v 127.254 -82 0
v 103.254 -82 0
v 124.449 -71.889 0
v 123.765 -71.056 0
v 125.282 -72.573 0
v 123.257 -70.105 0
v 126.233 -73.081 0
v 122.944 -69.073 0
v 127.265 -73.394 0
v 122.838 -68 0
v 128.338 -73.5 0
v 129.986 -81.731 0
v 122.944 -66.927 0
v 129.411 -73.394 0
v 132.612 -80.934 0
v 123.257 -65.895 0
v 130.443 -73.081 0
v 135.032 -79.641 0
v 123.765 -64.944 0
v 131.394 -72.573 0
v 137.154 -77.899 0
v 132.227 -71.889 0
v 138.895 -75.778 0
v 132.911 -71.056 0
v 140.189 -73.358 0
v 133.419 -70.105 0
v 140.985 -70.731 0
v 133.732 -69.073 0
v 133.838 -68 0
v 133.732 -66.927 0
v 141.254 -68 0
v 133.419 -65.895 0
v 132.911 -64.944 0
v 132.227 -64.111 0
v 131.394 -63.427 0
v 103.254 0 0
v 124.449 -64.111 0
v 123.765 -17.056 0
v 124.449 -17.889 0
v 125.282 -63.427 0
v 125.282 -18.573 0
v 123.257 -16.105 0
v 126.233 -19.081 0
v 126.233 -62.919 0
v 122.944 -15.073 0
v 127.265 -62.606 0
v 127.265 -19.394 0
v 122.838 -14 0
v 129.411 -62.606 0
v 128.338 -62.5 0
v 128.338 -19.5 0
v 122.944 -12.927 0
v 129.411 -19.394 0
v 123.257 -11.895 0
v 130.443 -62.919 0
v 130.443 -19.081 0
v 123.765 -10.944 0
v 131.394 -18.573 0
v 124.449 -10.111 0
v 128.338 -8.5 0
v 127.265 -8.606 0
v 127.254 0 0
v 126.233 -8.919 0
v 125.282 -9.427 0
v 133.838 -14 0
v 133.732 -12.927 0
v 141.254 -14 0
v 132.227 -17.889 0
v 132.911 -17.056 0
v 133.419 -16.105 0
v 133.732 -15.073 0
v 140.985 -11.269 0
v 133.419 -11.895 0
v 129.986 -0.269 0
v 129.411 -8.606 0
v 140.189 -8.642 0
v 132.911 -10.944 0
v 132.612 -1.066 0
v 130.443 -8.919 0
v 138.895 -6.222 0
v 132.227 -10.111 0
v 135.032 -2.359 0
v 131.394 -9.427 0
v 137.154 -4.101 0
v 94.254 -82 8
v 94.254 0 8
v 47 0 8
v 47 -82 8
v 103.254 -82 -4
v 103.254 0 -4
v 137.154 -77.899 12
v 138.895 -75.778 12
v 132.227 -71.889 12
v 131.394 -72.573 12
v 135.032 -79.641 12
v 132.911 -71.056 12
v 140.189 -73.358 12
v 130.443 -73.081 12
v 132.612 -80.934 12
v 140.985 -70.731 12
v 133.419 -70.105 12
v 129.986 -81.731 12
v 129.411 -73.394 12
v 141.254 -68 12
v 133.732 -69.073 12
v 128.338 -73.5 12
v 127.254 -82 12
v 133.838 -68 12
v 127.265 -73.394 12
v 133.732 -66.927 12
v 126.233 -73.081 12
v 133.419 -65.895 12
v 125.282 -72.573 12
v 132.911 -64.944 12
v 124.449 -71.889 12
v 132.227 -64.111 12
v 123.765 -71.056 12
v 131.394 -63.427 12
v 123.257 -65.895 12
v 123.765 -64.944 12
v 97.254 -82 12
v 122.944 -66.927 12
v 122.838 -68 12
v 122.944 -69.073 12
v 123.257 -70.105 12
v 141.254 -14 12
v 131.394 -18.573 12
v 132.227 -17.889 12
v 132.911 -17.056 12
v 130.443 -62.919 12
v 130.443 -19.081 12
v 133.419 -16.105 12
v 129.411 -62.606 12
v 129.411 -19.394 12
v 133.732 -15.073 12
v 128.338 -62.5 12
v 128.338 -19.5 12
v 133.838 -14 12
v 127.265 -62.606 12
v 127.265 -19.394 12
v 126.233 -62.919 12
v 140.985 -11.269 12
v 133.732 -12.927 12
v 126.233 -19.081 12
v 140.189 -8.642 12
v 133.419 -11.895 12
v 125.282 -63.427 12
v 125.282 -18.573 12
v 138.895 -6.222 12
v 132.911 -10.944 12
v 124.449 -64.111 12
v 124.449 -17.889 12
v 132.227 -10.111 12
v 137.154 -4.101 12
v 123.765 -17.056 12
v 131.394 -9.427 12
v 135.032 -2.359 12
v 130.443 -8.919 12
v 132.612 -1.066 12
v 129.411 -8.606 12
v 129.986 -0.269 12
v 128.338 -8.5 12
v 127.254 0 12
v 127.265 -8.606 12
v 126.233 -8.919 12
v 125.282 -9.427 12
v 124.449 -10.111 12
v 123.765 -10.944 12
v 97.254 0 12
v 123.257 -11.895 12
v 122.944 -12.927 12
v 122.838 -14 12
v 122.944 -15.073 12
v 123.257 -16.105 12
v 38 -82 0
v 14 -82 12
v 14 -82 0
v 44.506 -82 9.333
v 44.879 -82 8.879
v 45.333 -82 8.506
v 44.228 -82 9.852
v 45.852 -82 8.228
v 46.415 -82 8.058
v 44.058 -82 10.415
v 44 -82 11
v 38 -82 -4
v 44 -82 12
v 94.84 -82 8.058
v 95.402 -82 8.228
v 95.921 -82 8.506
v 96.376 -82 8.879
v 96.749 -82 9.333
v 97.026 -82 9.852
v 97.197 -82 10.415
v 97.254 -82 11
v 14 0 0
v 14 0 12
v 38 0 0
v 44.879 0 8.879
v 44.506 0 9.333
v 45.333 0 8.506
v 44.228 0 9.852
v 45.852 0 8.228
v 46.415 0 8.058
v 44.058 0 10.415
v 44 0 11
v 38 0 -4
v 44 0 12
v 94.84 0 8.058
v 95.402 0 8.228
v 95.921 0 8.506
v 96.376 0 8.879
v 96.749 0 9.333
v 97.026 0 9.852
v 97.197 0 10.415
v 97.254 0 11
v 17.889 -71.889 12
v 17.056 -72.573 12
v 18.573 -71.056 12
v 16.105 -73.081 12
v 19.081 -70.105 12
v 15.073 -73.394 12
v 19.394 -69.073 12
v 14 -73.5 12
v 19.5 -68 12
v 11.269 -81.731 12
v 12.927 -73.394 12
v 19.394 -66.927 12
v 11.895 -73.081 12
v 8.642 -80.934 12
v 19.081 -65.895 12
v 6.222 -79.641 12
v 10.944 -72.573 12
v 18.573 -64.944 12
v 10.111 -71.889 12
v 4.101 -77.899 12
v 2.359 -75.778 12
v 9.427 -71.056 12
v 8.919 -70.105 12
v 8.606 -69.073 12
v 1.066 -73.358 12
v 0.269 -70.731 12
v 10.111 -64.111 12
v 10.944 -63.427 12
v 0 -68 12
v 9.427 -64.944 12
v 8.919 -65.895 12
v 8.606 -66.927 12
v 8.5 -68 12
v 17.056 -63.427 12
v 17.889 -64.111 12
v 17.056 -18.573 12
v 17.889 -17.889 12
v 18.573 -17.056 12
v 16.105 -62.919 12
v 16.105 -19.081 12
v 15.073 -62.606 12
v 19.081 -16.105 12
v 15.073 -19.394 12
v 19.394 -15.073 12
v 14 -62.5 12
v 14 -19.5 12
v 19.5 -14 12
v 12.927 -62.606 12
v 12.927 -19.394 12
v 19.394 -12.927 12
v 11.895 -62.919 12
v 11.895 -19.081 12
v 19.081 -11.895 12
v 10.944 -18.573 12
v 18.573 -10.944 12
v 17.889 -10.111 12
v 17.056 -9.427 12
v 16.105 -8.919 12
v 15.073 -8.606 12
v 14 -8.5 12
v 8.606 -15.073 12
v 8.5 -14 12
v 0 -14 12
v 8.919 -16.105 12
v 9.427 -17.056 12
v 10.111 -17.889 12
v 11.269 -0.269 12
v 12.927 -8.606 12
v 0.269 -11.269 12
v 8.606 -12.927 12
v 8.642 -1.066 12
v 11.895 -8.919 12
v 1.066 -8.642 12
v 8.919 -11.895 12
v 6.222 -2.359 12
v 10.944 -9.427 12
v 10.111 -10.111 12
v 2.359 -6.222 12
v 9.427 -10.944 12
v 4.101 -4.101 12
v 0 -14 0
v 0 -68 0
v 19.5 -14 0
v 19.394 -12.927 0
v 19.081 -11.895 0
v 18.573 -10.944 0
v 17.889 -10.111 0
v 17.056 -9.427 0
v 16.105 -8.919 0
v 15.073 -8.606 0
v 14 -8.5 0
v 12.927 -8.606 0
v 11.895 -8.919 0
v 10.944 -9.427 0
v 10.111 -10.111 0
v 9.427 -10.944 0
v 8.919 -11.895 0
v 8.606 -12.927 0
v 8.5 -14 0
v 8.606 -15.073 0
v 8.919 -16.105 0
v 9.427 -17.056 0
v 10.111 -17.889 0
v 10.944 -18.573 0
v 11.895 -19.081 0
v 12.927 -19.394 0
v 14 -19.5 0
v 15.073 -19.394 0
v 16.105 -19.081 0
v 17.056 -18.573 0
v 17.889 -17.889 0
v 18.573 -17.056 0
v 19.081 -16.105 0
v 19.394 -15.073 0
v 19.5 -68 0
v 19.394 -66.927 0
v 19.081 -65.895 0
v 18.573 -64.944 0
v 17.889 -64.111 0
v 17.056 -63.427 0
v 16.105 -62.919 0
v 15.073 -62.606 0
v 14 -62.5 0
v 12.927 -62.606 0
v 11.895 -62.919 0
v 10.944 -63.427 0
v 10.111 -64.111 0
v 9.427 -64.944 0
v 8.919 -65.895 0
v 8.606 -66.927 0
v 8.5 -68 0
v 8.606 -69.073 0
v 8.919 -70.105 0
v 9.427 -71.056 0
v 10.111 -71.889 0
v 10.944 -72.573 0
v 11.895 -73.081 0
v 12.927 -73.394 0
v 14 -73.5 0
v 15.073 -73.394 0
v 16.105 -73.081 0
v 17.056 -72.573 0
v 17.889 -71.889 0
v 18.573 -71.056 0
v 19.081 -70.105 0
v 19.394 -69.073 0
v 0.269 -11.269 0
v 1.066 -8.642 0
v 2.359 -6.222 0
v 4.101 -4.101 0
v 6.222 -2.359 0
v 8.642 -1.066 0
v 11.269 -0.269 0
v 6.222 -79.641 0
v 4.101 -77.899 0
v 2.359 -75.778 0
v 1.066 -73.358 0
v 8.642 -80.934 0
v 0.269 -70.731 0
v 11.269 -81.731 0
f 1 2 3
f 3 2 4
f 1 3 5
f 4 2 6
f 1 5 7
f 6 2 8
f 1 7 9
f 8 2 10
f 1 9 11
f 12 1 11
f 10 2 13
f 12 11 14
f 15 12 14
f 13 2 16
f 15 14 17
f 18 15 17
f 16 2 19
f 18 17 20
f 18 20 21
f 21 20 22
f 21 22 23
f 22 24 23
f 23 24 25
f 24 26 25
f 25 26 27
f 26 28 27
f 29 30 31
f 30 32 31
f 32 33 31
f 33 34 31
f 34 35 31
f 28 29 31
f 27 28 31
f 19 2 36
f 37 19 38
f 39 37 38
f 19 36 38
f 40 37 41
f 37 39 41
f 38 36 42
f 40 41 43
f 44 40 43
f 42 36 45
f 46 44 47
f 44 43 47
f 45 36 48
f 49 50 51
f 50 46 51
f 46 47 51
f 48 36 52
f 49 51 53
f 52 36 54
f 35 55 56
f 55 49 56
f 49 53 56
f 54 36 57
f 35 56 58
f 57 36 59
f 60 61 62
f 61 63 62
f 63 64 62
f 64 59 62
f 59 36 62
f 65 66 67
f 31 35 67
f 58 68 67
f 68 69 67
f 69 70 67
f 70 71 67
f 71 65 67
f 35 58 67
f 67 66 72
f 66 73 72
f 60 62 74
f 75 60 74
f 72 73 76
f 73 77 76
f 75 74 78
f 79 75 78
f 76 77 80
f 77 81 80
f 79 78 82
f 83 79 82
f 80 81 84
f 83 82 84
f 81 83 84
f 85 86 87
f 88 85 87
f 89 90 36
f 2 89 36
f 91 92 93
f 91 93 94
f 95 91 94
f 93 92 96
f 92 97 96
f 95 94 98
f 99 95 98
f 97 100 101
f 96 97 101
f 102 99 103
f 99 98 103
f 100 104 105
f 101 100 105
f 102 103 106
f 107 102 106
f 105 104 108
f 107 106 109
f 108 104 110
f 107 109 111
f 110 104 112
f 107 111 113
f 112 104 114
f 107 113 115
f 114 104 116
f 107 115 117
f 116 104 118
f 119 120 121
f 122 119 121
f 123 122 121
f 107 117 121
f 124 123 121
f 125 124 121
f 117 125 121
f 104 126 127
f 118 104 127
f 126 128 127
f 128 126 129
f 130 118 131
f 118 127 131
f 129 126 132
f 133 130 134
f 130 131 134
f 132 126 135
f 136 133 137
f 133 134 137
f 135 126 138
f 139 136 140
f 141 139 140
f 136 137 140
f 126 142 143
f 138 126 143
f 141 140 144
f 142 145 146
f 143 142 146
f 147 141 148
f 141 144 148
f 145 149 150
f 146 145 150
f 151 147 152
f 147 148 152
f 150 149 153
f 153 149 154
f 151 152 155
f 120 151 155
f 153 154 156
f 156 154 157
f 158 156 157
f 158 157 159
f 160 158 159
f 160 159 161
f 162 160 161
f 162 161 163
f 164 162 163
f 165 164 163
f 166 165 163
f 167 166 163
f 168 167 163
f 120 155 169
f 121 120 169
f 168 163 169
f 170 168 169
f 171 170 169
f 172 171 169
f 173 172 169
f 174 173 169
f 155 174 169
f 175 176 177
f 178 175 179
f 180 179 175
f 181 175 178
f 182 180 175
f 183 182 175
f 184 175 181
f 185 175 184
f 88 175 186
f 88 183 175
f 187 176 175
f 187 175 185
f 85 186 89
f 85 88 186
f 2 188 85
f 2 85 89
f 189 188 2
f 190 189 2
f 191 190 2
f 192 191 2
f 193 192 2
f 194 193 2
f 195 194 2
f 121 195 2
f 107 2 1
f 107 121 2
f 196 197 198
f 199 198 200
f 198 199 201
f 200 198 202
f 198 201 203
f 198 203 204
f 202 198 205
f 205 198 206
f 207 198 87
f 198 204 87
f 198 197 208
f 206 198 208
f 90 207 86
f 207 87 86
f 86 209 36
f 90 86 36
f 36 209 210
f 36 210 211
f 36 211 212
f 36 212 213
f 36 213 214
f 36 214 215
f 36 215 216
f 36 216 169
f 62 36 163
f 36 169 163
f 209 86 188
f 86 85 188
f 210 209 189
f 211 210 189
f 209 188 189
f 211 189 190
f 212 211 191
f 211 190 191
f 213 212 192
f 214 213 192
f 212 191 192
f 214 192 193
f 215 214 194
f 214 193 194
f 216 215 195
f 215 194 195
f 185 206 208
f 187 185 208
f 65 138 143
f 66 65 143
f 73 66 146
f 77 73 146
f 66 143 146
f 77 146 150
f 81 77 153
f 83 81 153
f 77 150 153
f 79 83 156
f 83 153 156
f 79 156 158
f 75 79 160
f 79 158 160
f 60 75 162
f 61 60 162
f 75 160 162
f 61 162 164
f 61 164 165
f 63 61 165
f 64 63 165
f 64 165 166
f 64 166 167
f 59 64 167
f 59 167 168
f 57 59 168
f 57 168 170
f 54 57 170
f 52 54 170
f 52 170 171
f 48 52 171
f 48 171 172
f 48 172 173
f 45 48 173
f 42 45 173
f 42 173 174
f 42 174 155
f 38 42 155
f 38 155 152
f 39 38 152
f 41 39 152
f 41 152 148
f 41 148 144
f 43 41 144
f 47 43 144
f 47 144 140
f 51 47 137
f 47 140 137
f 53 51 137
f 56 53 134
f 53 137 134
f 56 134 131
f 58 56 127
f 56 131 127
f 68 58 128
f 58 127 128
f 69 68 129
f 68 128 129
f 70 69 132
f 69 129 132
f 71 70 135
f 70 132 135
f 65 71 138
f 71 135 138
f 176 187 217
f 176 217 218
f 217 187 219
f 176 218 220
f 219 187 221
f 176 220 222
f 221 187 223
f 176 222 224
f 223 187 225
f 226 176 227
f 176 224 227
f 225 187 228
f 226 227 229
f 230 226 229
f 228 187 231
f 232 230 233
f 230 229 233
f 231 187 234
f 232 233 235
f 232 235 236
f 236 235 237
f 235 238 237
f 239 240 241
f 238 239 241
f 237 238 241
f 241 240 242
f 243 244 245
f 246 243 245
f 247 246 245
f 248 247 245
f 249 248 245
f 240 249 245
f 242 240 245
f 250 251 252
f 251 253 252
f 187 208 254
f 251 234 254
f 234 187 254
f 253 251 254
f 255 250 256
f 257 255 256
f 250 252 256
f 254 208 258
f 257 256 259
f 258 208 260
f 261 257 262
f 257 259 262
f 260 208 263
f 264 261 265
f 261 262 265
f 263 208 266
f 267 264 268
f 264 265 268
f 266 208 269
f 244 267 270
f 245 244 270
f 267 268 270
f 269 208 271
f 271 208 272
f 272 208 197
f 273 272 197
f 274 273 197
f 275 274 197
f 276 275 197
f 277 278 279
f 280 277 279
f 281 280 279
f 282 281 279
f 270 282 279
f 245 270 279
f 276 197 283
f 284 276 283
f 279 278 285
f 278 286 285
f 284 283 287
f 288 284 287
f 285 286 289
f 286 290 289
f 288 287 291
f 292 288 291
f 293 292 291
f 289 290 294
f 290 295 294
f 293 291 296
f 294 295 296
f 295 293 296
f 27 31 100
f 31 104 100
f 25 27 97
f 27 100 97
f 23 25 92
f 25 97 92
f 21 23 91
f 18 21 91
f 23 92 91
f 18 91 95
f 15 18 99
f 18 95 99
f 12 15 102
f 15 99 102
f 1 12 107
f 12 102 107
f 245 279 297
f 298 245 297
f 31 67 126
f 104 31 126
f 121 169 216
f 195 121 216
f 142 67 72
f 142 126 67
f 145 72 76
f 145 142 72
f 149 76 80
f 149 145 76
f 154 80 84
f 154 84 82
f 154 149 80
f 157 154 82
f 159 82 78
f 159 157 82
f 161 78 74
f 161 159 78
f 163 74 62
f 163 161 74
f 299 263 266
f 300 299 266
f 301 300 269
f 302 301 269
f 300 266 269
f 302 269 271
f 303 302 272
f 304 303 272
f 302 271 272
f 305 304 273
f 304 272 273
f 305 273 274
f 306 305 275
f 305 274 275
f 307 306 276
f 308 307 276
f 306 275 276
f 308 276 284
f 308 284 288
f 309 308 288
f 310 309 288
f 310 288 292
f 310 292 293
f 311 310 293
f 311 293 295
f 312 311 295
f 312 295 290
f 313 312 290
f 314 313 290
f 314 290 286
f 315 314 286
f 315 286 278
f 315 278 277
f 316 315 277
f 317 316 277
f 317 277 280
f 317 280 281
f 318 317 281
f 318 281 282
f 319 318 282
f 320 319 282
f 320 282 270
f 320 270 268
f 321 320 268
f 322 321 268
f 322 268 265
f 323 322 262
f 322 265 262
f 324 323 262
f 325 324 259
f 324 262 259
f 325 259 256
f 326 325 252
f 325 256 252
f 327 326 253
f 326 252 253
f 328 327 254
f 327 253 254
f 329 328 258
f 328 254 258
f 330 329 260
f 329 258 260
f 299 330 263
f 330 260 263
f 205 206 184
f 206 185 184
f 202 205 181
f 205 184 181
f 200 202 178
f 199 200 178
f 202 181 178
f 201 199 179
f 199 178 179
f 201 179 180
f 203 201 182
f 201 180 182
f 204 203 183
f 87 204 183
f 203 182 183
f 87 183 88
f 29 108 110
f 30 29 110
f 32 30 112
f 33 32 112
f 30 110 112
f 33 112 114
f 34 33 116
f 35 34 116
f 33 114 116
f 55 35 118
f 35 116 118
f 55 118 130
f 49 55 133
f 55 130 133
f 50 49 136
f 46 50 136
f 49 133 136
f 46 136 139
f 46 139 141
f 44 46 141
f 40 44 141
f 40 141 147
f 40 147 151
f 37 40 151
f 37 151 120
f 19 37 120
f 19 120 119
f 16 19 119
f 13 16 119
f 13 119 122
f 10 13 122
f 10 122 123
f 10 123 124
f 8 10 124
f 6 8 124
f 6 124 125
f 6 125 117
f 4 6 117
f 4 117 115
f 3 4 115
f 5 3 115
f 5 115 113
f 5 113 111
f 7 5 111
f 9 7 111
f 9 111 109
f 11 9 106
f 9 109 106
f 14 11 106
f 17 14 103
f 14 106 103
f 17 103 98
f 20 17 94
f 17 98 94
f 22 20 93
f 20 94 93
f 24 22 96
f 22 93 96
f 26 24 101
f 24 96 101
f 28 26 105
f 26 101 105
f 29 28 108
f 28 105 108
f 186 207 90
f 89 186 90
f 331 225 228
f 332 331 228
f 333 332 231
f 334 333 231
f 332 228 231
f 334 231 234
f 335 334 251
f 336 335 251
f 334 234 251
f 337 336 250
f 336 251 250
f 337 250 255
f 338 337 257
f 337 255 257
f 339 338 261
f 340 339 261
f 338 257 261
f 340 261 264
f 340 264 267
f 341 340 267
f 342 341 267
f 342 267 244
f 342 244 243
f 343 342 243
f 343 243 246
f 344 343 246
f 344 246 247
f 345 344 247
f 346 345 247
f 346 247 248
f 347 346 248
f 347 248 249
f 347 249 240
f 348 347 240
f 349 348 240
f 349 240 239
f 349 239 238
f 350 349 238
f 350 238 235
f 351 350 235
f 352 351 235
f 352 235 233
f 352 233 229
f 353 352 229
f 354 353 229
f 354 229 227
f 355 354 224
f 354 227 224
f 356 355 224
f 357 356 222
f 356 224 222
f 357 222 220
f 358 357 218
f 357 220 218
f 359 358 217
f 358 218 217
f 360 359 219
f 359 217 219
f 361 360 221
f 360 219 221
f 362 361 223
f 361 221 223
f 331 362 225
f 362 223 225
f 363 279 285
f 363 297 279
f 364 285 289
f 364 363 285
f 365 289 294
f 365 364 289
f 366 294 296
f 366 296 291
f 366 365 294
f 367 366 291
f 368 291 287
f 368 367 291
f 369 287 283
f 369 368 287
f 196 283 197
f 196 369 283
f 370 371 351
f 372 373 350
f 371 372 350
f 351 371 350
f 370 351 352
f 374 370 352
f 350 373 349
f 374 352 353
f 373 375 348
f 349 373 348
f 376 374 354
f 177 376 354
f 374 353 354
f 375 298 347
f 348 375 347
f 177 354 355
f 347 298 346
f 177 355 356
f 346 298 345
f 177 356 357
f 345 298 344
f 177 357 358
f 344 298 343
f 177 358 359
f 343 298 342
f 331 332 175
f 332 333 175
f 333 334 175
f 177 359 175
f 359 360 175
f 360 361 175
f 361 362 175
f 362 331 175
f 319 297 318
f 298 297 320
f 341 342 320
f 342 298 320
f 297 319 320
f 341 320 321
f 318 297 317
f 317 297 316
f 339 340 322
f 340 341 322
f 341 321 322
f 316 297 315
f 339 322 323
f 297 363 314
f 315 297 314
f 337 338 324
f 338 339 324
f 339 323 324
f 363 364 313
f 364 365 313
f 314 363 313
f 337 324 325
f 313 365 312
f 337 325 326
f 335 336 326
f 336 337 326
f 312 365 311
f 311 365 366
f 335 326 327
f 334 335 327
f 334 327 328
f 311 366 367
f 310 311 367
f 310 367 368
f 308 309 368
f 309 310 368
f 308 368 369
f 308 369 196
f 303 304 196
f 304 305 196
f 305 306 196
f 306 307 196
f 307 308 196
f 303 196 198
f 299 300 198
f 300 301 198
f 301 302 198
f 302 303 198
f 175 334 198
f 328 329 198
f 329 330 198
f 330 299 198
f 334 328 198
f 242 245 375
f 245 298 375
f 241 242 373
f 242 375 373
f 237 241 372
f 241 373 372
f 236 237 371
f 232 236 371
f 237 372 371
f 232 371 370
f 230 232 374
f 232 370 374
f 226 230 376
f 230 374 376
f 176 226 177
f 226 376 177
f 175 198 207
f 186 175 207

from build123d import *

# Parameters (mm, degrees)
F1_DEPTH = 82
F2_R     = 14
F3_R     = 5.5
F4_DEPTH = 16.001
F5_R     = 3


with BuildPart() as f1:
    # F0 (on Front) → F1 (new body)
    with BuildSketch(Plane.XZ):
        Polygon((0, 12), (0, 0), (38, 0), (38, -4), (103.254273, -4), (103.254273, 0), (141.254273, 0), (141.254273, 12), (97.254273, 12), (97.254273, 8), (44, 8), (44, 12), align=None)
    extrude(amount=F1_DEPTH)

    # F2
    f2_edges = [f1.edges().sort_by_distance(p)[0] for p in [
        (141.254273, -82, 6),
        (141.254273, 0, 6),
        (0, -82, 6),
        (0, 0, 6),
    ]]
    fillet(f2_edges, radius=F2_R)

    # F3 (on face) → F4 (cut, through all)
    with BuildSketch(Plane.XY.offset(12)):
        with Locations((128.337874, -68)):
            Circle(F3_R)
        with Locations((128.337874, -14)):
            Circle(F3_R)
        with Locations((14, -68)):
            Circle(F3_R)
        with Locations((14, -14)):
            Circle(F3_R)
    extrude(amount=-F4_DEPTH, mode=Mode.SUBTRACT)

    # F5
    f5_edges = [f1.edges().sort_by_distance(p)[0] for p in [
        (44, -41, 8),
        (97.254273, -41, 8),
    ]]
    fillet(f5_edges, radius=F5_R)


solid = f1.part
